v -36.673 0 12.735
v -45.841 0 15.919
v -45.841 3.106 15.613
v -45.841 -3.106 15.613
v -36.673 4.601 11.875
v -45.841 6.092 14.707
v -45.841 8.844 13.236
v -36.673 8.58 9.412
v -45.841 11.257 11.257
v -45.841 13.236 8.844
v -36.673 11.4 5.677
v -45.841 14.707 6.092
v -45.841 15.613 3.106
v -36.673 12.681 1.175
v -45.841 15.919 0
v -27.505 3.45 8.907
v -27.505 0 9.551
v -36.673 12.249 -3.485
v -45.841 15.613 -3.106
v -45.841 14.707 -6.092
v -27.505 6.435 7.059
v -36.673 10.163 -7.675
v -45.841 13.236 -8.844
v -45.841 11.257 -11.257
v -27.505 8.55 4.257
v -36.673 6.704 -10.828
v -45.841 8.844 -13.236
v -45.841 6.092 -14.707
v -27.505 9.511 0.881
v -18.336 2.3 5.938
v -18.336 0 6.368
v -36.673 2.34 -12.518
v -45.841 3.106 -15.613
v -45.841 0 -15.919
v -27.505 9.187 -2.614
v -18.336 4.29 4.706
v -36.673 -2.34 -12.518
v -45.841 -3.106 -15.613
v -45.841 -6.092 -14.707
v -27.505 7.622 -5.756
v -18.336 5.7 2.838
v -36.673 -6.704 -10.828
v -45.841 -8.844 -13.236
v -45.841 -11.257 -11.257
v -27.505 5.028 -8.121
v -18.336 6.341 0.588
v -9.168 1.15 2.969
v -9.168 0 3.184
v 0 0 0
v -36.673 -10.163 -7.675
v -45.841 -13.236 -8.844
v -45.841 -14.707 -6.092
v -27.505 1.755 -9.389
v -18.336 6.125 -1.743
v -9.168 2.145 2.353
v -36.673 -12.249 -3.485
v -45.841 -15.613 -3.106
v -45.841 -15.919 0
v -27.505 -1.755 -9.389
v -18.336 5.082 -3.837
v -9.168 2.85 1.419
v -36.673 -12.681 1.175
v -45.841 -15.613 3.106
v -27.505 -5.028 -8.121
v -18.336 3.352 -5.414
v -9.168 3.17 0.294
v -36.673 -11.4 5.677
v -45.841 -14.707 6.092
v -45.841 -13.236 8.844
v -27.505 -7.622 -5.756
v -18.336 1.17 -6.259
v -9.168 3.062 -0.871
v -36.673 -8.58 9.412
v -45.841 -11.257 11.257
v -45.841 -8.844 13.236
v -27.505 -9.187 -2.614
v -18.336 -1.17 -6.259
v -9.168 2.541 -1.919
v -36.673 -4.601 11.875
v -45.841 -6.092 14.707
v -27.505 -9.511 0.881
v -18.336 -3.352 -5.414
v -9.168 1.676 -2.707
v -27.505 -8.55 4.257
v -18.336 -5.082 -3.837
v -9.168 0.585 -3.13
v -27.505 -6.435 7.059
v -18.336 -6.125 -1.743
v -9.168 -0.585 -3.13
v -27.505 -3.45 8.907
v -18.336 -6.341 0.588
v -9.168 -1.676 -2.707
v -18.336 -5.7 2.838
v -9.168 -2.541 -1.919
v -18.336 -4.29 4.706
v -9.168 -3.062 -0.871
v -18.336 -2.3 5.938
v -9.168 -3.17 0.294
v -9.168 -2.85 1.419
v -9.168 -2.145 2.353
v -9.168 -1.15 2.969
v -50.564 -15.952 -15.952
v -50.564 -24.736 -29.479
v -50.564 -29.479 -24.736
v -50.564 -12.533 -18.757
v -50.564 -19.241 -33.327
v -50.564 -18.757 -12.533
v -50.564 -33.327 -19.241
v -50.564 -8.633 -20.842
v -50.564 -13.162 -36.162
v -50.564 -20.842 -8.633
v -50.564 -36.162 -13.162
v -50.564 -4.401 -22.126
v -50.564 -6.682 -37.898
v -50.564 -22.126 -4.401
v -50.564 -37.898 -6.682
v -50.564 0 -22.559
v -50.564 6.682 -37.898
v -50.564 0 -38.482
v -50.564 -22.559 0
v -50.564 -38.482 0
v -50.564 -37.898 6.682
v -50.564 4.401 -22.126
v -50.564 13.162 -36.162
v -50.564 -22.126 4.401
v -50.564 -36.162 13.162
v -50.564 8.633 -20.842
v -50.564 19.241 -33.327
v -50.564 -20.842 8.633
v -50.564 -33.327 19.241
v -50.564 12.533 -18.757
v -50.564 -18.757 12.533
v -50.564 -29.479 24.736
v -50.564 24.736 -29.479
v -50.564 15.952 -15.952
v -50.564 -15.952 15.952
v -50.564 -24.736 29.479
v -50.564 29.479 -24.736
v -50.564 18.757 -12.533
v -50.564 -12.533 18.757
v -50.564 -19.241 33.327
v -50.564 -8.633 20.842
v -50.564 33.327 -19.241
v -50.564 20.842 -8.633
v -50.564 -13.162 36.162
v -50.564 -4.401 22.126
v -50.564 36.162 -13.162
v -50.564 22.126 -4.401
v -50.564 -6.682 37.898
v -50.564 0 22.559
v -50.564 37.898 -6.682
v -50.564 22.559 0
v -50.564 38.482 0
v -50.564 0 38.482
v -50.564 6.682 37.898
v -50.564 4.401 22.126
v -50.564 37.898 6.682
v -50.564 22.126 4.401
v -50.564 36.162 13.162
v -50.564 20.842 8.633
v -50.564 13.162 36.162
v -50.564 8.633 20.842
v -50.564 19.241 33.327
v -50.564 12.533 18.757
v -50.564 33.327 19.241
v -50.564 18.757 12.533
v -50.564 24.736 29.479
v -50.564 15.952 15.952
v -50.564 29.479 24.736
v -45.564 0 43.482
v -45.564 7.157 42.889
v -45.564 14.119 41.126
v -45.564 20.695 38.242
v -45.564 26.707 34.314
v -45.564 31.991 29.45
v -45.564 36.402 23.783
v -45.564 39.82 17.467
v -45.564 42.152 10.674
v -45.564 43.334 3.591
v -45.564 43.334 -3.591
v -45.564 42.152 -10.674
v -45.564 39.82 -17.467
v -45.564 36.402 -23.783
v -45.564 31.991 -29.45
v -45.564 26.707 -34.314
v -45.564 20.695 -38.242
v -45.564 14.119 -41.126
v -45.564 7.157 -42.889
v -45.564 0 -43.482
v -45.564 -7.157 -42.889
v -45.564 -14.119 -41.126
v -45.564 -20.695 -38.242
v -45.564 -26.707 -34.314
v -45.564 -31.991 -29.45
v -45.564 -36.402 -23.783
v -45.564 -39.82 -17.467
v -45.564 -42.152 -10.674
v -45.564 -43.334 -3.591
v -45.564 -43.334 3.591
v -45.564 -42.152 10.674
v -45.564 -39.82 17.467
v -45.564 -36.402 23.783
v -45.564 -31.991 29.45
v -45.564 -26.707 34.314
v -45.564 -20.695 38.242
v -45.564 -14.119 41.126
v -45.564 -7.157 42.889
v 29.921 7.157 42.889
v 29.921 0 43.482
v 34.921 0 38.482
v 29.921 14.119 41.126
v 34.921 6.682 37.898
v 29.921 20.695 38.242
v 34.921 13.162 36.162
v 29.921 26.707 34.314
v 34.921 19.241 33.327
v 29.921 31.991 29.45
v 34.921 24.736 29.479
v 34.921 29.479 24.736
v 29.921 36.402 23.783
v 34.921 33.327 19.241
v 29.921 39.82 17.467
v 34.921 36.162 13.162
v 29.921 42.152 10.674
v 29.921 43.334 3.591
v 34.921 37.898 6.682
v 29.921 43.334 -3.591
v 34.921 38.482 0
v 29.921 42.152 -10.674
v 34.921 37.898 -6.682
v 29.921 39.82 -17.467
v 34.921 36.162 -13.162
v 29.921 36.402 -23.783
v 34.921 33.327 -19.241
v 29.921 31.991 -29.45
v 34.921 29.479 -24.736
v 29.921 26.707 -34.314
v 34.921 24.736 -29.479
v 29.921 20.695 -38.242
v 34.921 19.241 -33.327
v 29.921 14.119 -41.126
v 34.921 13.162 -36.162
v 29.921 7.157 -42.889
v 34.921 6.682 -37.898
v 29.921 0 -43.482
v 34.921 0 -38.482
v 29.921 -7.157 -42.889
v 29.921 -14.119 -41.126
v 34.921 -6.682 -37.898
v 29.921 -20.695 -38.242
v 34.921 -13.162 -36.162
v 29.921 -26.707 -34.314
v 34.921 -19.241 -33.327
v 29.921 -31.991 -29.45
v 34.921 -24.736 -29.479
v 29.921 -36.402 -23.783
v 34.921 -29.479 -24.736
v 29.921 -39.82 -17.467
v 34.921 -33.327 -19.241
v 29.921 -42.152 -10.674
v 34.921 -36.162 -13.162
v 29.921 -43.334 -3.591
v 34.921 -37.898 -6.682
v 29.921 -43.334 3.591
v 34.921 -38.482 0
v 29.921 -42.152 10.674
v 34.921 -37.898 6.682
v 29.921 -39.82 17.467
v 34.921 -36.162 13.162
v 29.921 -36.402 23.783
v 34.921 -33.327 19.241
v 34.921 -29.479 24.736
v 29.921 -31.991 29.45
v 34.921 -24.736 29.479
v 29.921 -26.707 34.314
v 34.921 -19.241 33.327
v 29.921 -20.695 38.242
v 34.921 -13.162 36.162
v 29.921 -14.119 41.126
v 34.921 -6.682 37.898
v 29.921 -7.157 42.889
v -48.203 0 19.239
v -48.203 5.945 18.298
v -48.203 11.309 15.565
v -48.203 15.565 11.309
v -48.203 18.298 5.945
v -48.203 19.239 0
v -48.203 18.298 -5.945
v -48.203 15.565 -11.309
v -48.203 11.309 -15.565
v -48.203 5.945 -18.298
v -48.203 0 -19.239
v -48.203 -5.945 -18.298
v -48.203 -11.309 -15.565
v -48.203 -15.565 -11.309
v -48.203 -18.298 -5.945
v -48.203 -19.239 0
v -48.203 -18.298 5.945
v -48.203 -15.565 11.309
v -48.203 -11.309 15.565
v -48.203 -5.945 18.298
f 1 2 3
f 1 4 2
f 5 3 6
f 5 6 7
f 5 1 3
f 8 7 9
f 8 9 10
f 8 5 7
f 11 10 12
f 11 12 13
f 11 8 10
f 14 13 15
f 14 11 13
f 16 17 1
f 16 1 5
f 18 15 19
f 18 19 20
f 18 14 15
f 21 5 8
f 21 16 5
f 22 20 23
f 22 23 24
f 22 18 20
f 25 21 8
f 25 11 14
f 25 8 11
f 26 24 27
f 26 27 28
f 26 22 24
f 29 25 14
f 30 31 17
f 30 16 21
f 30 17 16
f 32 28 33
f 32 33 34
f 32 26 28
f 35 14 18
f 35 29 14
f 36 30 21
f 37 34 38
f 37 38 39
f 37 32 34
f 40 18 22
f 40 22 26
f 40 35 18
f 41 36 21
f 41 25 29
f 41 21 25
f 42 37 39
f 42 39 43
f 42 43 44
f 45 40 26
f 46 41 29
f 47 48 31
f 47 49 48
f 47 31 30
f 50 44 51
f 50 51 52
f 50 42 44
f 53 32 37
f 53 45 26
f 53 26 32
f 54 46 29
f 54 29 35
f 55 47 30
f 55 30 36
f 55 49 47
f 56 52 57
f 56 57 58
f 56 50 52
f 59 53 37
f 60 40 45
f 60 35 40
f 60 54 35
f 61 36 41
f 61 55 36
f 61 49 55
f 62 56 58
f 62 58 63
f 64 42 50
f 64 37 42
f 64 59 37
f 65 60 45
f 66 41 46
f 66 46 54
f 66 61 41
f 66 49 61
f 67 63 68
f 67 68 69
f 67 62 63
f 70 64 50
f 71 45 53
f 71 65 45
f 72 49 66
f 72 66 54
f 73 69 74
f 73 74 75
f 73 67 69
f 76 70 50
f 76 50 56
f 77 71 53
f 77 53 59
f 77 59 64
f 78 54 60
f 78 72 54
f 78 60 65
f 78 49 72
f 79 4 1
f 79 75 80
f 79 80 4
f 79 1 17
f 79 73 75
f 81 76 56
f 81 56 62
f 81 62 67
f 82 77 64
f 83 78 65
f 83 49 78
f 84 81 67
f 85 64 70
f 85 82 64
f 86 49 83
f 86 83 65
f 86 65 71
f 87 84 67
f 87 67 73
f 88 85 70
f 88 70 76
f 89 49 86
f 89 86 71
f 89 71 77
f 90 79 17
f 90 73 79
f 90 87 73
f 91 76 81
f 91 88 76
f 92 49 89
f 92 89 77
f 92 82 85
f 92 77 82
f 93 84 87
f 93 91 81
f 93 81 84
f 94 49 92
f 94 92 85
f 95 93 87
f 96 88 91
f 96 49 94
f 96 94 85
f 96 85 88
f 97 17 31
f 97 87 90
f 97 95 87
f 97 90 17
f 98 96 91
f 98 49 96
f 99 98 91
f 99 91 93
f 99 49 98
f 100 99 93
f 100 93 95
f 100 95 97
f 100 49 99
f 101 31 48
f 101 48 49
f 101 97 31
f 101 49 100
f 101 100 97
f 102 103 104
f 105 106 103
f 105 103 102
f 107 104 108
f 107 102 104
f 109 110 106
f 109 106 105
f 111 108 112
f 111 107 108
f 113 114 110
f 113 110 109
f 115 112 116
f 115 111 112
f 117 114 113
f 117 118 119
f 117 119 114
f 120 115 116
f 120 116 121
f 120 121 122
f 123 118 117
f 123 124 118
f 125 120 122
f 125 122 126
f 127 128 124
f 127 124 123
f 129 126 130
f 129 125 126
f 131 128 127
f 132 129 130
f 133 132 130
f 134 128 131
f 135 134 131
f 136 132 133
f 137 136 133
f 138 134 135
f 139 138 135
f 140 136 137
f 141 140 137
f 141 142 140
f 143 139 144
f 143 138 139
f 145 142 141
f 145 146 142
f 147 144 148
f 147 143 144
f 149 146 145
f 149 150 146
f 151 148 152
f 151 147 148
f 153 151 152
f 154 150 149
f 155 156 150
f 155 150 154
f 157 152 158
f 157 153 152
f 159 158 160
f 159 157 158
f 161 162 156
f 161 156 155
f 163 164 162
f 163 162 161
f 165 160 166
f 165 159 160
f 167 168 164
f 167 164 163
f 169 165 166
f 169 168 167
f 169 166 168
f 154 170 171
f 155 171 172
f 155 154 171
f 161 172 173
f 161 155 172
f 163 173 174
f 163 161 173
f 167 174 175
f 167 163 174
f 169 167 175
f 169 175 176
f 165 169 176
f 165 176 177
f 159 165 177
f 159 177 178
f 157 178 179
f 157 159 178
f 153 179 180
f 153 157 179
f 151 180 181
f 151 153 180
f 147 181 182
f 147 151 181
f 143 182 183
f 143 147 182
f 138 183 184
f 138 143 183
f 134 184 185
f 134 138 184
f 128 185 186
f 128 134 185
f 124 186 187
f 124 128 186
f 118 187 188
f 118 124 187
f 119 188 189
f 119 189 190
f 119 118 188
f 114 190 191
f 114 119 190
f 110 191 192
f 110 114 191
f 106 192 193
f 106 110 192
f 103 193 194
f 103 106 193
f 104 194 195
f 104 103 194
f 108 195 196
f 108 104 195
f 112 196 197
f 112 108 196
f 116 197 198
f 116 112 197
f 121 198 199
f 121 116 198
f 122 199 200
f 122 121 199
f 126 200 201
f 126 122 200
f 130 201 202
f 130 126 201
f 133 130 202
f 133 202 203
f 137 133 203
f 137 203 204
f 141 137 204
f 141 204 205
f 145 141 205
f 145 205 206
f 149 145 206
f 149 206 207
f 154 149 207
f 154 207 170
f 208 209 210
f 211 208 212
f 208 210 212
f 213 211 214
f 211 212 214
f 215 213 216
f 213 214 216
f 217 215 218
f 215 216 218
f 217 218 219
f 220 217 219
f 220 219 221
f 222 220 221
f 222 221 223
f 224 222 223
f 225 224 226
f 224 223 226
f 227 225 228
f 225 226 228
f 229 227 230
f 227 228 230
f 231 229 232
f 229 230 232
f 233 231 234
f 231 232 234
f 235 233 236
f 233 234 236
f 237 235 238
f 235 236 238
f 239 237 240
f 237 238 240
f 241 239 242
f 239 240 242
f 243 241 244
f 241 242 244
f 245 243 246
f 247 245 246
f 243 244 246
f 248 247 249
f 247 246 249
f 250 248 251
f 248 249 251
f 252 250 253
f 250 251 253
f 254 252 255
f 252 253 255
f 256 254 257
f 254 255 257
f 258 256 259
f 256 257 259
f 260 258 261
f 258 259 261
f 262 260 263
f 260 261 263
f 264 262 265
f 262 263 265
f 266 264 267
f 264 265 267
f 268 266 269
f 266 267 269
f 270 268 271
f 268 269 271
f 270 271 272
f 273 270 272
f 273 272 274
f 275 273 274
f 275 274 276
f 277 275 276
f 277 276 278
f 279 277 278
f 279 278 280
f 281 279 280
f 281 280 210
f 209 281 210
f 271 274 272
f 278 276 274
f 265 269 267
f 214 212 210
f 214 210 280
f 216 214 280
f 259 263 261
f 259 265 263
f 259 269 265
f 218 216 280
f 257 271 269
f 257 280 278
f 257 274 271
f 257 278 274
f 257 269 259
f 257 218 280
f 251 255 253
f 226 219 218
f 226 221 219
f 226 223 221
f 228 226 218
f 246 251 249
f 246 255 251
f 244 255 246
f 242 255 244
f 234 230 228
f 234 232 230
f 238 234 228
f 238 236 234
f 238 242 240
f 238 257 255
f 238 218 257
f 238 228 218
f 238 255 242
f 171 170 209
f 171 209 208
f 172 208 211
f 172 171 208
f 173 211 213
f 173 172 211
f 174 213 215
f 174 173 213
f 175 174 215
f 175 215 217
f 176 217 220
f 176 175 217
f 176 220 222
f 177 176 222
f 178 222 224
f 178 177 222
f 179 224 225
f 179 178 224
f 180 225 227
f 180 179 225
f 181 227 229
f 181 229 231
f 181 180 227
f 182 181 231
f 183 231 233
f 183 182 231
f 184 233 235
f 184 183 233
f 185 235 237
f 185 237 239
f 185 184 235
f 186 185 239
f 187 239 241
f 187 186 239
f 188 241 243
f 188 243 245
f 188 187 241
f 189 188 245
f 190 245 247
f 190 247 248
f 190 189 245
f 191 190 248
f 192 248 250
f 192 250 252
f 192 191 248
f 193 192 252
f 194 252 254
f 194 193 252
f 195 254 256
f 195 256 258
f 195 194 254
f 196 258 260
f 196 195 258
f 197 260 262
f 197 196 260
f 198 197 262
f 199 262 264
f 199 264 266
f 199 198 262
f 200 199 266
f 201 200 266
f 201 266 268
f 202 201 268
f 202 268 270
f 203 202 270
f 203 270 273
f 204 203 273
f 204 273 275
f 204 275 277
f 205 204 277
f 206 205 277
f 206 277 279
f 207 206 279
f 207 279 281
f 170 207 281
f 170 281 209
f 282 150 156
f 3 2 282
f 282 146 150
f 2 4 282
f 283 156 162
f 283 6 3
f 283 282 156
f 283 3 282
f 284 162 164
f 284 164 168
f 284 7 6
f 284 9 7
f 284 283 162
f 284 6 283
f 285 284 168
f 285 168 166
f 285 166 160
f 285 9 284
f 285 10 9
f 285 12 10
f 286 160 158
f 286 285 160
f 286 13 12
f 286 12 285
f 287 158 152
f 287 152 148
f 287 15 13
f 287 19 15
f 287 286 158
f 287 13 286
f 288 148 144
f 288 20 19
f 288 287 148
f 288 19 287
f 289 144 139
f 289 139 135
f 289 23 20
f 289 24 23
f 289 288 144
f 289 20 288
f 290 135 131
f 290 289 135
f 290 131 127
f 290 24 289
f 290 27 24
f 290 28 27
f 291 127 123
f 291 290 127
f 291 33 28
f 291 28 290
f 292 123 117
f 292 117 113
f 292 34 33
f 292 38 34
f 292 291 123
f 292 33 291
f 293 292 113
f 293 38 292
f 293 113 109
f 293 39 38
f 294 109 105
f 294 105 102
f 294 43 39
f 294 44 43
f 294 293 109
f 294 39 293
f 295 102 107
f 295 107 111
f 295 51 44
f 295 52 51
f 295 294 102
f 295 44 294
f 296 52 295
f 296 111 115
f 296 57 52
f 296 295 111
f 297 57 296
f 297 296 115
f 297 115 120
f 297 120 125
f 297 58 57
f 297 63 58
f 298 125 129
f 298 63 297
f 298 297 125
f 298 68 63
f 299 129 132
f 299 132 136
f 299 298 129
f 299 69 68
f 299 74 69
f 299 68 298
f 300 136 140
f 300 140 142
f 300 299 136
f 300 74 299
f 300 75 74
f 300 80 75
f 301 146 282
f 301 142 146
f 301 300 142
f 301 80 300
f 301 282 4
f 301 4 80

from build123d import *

# Parameters (mm, degrees)
F2_SIZE = 5
F3_SIZE = 5
F4_SIZE = 5


with BuildPart() as f1:
    # F0 (on Front) → F1 (revolve)
    with BuildSketch(Plane.XZ):
        Polygon((34.920584, 43.482468), (-50.5643, 43.482468), (-50.5643, 17.559418), (0, 0), (34.920584, 0), (34.920584, 17.559418), align=None)
    revolve(axis=Axis((17.460292, 0, 0), (-1, 0, 0)))

    # F2
    f2_edges = [f1.edges().sort_by_distance(p)[0] for p in [
        (-50.5643, 0, -43.482468),
    ]]
    chamfer(f2_edges, length=F2_SIZE)

    # F3
    f3_edges = [f1.edges().sort_by_distance(p)[0] for p in [
        (-50.5643, 0, -17.559418),
    ]]
    chamfer(f3_edges, length=F3_SIZE)

    # F4
    f4_edges = [f1.edges().sort_by_distance(p)[0] for p in [
        (34.920584, 0, -43.482468),
    ]]
    chamfer(f4_edges, length=F4_SIZE)


solid = f1.part
